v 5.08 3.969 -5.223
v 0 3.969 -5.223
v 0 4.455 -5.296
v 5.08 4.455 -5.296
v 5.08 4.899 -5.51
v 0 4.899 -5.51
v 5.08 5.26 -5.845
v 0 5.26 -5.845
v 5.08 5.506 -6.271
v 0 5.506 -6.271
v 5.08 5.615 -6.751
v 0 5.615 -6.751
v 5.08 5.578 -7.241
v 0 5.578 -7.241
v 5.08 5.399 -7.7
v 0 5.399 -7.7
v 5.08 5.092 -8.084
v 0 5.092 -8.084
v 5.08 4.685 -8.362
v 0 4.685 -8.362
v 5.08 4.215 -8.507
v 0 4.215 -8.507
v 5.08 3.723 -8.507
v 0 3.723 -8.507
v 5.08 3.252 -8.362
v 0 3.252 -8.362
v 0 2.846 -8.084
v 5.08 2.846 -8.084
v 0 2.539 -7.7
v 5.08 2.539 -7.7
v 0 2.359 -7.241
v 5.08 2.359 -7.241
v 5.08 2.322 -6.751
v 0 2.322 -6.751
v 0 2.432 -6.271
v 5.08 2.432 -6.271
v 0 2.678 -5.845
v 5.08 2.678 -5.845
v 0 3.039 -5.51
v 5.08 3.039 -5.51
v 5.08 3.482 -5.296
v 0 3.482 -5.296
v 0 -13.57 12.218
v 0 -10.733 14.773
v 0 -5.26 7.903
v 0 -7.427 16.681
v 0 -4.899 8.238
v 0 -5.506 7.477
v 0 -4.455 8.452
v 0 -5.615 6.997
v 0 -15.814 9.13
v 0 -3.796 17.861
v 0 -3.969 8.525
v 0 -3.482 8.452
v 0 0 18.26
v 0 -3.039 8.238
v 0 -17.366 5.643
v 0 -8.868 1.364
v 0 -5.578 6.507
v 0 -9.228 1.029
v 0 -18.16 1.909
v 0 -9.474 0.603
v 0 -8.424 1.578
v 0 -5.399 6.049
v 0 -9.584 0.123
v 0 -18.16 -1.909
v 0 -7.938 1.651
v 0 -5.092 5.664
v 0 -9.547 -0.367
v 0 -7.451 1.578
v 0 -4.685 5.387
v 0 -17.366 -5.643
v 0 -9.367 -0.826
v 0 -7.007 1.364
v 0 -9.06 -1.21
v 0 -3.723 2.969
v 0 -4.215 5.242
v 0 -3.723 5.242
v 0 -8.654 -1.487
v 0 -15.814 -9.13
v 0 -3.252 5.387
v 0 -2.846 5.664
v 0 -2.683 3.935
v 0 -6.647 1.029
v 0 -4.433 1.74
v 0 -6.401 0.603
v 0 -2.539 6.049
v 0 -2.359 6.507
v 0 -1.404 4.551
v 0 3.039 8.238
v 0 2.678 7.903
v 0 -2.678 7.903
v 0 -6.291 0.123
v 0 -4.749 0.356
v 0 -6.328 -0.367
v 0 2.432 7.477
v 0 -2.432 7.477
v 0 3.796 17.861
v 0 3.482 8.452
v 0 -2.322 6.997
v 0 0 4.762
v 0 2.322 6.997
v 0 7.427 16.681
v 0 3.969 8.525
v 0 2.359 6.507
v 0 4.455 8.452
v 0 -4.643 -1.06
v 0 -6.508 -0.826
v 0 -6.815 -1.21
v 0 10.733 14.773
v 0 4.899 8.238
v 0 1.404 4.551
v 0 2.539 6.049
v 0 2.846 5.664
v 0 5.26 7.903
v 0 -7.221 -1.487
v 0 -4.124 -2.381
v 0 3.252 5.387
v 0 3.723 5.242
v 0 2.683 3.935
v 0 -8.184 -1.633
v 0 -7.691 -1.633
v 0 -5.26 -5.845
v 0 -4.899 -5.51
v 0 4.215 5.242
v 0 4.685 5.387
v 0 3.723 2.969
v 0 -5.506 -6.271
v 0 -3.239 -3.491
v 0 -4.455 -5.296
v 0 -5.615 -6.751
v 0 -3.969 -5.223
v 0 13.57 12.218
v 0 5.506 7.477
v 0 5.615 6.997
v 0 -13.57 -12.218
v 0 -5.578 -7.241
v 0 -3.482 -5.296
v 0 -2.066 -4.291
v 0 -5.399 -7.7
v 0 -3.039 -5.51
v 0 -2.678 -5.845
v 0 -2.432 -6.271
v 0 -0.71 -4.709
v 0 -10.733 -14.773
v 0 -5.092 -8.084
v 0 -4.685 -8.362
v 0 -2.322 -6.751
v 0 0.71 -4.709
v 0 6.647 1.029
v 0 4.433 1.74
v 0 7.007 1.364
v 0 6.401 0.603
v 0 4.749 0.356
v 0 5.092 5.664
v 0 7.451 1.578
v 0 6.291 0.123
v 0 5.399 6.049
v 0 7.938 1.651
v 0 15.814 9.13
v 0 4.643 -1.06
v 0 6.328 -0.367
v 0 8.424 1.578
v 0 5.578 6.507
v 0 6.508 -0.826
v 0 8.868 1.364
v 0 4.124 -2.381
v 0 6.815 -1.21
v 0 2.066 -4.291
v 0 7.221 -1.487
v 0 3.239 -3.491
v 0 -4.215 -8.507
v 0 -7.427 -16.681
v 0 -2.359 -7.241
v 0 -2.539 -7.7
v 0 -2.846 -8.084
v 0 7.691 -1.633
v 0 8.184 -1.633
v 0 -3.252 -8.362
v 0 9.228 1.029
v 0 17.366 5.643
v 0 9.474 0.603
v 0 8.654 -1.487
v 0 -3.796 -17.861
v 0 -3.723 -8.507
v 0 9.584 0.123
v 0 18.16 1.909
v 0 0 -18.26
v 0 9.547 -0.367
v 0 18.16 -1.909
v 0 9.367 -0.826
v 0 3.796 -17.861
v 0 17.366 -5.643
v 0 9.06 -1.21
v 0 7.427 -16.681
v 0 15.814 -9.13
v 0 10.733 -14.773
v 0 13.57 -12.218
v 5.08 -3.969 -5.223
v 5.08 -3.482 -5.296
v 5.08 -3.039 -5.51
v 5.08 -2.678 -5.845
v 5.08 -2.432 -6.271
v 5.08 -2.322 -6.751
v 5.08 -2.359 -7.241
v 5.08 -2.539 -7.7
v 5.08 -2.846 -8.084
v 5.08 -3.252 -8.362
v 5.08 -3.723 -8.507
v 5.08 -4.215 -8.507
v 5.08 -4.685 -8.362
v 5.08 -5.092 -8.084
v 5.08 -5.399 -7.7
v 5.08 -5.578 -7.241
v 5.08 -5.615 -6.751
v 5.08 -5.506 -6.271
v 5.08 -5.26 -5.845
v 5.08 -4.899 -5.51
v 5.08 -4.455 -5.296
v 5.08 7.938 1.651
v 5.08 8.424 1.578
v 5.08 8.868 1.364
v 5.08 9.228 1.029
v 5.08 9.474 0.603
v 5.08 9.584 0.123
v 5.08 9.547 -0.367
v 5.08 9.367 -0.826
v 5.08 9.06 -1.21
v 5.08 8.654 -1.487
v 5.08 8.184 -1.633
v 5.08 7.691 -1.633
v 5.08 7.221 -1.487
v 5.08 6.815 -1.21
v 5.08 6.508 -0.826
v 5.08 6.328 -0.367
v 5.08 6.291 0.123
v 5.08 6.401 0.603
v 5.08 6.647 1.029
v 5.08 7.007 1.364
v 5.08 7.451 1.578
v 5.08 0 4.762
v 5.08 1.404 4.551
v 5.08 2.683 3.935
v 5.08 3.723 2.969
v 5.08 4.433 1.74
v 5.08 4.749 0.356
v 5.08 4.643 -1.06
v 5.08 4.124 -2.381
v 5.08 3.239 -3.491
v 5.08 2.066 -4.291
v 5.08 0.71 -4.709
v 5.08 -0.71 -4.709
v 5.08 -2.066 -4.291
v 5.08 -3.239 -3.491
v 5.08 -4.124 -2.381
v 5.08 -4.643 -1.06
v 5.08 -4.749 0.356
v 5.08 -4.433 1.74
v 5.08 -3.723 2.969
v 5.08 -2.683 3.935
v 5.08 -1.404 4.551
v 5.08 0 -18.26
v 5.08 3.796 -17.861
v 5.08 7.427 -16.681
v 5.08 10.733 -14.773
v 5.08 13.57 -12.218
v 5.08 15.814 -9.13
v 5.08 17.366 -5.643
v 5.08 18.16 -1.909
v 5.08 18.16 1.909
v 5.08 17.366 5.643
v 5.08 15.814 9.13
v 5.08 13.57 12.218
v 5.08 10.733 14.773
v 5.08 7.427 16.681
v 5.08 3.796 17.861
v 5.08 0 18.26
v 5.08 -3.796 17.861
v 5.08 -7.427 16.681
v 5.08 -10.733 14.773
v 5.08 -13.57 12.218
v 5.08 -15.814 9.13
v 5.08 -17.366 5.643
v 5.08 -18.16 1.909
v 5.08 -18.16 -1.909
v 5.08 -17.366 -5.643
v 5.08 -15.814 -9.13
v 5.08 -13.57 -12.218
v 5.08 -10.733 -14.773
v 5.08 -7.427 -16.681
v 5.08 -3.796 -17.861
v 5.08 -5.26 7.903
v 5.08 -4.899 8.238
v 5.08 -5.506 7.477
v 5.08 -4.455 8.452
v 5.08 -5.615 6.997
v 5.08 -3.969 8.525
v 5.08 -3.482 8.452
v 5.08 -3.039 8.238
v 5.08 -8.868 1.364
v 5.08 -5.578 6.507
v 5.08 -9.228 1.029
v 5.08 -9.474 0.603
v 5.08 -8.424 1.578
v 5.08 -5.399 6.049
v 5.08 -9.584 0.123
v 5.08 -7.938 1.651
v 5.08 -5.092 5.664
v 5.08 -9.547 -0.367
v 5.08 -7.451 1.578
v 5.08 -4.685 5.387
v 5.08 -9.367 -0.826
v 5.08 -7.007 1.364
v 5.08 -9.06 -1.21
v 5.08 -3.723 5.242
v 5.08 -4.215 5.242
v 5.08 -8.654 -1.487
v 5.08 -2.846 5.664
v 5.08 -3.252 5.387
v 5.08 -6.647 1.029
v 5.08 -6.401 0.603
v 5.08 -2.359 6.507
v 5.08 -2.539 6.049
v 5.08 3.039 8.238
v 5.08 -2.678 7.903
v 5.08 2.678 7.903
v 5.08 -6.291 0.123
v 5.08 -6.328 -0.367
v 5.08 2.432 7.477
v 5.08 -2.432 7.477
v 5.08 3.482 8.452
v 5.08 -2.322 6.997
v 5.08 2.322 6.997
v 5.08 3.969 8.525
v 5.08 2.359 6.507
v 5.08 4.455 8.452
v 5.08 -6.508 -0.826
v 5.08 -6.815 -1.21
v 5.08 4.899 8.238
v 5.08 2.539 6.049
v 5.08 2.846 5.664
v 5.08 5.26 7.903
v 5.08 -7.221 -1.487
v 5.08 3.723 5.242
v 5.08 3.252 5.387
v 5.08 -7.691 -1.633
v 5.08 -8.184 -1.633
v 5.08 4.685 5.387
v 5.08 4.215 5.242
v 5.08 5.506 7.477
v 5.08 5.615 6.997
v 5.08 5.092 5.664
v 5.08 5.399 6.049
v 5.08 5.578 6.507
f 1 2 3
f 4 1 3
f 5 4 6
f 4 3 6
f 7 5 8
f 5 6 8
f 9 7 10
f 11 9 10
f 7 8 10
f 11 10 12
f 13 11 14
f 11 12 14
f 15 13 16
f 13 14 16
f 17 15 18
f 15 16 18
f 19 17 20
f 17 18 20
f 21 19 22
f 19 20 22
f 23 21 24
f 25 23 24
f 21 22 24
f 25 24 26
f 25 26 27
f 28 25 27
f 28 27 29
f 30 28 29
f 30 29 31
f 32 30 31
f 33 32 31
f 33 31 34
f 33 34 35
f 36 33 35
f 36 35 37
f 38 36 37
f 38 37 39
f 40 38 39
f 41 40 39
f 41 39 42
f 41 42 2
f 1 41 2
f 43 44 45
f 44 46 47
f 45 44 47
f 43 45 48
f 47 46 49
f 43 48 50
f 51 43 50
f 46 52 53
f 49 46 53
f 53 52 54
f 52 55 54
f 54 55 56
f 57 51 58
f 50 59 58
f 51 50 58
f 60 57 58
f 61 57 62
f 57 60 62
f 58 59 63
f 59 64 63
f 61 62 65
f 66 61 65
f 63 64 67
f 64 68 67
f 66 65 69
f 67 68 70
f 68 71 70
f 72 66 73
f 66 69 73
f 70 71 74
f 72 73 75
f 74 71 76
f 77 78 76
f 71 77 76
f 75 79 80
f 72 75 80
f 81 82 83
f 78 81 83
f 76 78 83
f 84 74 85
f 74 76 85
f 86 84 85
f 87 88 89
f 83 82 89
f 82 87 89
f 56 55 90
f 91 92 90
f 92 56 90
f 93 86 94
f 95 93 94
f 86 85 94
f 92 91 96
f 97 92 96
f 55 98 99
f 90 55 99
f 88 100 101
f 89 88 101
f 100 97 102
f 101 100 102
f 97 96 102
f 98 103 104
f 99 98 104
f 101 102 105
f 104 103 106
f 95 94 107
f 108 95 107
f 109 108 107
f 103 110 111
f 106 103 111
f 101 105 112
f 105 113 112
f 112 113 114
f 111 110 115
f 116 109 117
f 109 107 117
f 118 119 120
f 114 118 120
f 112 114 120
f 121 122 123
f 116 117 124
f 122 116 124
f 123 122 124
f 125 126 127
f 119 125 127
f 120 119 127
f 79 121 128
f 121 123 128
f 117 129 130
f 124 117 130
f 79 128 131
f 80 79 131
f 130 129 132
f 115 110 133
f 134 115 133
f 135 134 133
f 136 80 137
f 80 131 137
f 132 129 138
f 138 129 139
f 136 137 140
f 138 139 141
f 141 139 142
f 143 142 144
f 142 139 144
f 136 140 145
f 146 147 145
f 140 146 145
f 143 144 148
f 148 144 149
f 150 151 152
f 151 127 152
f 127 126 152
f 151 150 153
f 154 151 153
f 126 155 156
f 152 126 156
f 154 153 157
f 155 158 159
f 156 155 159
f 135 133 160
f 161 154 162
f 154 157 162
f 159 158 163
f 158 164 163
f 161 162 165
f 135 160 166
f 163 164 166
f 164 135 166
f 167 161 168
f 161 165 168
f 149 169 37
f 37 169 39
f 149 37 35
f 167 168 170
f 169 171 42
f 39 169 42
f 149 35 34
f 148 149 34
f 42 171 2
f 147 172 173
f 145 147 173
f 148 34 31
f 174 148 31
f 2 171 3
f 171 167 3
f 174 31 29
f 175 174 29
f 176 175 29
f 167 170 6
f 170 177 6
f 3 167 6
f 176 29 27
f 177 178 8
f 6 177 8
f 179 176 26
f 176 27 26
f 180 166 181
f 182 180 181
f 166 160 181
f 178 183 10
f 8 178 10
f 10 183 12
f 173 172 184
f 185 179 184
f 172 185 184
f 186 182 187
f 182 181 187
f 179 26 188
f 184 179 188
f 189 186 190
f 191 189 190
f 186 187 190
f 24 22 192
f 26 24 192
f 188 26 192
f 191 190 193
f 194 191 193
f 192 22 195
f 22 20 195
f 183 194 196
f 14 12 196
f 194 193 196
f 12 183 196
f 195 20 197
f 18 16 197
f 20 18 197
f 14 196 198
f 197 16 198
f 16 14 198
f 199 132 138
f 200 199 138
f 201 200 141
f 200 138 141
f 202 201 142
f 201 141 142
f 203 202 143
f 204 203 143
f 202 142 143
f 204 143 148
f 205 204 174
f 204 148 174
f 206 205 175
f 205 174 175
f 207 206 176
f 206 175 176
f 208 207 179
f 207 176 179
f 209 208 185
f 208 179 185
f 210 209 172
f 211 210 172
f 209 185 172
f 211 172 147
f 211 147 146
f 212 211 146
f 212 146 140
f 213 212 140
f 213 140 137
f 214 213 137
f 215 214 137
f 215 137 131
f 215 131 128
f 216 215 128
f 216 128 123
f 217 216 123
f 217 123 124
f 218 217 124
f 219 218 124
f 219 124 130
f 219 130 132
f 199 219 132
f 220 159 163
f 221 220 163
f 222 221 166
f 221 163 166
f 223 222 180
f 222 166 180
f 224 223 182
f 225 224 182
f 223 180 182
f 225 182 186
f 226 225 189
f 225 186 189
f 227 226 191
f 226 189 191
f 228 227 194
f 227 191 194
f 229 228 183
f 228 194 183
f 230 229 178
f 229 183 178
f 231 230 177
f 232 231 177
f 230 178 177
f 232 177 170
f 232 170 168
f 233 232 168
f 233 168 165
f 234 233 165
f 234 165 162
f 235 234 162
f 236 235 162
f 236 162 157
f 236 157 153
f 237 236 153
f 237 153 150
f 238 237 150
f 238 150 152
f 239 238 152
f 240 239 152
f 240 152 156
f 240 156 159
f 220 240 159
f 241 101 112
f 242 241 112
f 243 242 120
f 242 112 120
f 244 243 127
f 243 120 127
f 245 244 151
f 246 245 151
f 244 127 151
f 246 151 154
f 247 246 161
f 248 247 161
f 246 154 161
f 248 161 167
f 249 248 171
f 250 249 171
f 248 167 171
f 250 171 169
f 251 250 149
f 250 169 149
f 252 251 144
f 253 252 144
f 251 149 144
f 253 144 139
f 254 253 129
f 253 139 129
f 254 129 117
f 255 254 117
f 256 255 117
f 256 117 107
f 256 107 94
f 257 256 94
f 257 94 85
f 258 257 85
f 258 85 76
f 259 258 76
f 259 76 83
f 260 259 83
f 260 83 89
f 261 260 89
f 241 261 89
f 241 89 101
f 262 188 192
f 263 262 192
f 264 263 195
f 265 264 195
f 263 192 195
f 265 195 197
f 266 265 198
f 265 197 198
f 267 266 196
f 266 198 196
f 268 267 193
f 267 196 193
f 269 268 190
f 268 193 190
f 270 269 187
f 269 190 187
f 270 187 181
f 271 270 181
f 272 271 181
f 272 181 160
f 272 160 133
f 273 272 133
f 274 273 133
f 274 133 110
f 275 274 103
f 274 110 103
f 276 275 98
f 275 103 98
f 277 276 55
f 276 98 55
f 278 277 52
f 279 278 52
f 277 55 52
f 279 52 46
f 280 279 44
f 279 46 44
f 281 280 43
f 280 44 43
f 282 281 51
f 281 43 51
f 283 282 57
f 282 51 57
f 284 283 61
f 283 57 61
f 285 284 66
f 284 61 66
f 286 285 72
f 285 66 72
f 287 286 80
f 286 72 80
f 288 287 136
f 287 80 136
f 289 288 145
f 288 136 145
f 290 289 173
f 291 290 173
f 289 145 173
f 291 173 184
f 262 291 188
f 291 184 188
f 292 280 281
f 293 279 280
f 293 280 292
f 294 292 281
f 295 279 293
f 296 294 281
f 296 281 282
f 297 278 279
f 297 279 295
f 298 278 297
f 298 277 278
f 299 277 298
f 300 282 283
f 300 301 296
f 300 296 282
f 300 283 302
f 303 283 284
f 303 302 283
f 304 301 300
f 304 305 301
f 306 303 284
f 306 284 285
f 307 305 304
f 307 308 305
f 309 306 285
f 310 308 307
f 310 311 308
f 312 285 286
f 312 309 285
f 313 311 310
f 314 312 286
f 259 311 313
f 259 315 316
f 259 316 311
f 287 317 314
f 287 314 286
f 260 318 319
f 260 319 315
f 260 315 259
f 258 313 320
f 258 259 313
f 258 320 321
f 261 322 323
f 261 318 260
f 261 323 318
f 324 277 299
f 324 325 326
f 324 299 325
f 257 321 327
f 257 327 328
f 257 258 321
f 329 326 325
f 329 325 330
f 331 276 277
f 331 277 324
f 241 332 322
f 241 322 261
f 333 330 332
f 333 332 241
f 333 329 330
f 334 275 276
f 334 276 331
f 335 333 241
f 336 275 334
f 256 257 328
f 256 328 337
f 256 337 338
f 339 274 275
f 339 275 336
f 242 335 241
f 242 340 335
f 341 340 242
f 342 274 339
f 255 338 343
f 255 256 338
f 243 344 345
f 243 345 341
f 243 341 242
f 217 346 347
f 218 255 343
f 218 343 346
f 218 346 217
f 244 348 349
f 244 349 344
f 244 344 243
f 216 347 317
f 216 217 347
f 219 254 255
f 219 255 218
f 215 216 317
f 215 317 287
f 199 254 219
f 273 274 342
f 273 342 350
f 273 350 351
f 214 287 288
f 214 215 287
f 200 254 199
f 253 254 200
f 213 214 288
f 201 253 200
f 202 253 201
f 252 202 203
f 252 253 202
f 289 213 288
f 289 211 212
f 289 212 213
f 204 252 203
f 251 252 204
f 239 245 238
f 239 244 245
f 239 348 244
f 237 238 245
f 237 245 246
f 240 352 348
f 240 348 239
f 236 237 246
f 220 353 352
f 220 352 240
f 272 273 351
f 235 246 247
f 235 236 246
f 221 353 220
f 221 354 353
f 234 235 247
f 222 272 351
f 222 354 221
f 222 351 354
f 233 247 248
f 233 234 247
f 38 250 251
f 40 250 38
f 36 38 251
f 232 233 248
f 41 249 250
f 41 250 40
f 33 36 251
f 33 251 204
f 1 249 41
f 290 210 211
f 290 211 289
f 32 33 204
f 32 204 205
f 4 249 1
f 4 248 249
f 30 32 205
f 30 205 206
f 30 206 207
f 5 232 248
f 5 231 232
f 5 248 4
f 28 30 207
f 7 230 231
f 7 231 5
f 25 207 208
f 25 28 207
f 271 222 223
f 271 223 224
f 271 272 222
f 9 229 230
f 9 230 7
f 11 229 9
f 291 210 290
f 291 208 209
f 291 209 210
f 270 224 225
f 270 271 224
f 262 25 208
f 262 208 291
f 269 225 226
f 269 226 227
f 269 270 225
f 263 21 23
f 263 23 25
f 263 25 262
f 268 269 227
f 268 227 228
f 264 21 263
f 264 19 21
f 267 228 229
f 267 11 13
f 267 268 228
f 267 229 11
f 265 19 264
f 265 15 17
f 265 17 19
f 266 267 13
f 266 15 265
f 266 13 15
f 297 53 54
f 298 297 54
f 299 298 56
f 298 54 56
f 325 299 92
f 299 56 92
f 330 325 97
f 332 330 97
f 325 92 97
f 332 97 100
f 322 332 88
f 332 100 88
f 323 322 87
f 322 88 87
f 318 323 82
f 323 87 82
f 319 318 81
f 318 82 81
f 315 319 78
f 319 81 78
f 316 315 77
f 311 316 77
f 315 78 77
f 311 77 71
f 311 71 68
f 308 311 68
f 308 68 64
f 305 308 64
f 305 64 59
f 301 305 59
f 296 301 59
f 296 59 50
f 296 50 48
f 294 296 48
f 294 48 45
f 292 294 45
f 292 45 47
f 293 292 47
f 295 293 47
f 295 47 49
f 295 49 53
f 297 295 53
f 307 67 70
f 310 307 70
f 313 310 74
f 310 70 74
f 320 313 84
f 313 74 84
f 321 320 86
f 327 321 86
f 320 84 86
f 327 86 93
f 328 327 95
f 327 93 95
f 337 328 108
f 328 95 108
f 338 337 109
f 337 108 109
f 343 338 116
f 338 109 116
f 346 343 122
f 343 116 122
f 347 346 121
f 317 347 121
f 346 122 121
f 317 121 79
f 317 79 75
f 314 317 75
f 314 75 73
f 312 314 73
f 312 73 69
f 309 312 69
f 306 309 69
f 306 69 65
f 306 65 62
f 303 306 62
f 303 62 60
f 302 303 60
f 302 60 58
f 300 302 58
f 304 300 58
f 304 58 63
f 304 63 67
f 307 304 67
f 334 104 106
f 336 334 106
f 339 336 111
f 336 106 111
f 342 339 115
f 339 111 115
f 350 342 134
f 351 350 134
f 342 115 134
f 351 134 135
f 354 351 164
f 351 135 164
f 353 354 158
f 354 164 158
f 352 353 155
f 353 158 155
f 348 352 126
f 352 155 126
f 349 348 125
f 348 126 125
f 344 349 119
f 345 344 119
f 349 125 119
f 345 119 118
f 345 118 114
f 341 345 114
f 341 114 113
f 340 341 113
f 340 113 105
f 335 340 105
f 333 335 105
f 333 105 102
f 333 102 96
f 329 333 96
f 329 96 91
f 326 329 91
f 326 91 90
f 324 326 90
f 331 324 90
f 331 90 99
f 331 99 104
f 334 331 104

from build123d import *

# Parameters (mm, degrees)
SKETCH1_R                 = 18.26006
BOSS_EXTRUDE1_DEPTH       = 5.08
F_4_CLEARANCE_HOLE1_D     = 3.302
F_4_CLEARANCE_HOLE2_D     = 9.525
F_4_CLEARANCE_HOLE2_DEPTH = 57.15
F_4_CLEARANCE_HOLE2_TIP   = 2.861598698


with BuildPart() as part:
    # Sketch1 → Boss-Extrude1 (new body)
    with BuildSketch(Plane(origin=(0, 0, 0), x_dir=(0, 0, -1), z_dir=(1, 0, 0))):
        Circle(SKETCH1_R)
    extrude(amount=BOSS_EXTRUDE1_DEPTH)

    # #4 Clearance Hole1 (through all)
    with Locations(Plane(origin=(5.08, 0, 0), x_dir=(0, 0, -1), z_dir=(1, 0, 0))):
        with Locations((0, 7.9375), (6.874076643, 3.96875), (6.874076643, -3.96875), (0, -7.9375), (-6.874076643, -3.96875), (-6.874076643, 3.96875), (0, 0)):
            Hole(F_4_CLEARANCE_HOLE1_D / 2)

    # #4 Clearance Hole2
    with Locations(Plane(origin=(5.08, 0, 0), x_dir=(0, 0, -1), z_dir=(1, 0, 0))):
        with Locations((0, 0)):
            Hole(F_4_CLEARANCE_HOLE2_D / 2, depth=F_4_CLEARANCE_HOLE2_DEPTH)
            with Locations((0, 0, -(F_4_CLEARANCE_HOLE2_DEPTH + F_4_CLEARANCE_HOLE2_TIP / 2))):  # 118° drill point
                Cone(0, F_4_CLEARANCE_HOLE2_D / 2, F_4_CLEARANCE_HOLE2_TIP, mode=Mode.SUBTRACT)


solid = part.part
